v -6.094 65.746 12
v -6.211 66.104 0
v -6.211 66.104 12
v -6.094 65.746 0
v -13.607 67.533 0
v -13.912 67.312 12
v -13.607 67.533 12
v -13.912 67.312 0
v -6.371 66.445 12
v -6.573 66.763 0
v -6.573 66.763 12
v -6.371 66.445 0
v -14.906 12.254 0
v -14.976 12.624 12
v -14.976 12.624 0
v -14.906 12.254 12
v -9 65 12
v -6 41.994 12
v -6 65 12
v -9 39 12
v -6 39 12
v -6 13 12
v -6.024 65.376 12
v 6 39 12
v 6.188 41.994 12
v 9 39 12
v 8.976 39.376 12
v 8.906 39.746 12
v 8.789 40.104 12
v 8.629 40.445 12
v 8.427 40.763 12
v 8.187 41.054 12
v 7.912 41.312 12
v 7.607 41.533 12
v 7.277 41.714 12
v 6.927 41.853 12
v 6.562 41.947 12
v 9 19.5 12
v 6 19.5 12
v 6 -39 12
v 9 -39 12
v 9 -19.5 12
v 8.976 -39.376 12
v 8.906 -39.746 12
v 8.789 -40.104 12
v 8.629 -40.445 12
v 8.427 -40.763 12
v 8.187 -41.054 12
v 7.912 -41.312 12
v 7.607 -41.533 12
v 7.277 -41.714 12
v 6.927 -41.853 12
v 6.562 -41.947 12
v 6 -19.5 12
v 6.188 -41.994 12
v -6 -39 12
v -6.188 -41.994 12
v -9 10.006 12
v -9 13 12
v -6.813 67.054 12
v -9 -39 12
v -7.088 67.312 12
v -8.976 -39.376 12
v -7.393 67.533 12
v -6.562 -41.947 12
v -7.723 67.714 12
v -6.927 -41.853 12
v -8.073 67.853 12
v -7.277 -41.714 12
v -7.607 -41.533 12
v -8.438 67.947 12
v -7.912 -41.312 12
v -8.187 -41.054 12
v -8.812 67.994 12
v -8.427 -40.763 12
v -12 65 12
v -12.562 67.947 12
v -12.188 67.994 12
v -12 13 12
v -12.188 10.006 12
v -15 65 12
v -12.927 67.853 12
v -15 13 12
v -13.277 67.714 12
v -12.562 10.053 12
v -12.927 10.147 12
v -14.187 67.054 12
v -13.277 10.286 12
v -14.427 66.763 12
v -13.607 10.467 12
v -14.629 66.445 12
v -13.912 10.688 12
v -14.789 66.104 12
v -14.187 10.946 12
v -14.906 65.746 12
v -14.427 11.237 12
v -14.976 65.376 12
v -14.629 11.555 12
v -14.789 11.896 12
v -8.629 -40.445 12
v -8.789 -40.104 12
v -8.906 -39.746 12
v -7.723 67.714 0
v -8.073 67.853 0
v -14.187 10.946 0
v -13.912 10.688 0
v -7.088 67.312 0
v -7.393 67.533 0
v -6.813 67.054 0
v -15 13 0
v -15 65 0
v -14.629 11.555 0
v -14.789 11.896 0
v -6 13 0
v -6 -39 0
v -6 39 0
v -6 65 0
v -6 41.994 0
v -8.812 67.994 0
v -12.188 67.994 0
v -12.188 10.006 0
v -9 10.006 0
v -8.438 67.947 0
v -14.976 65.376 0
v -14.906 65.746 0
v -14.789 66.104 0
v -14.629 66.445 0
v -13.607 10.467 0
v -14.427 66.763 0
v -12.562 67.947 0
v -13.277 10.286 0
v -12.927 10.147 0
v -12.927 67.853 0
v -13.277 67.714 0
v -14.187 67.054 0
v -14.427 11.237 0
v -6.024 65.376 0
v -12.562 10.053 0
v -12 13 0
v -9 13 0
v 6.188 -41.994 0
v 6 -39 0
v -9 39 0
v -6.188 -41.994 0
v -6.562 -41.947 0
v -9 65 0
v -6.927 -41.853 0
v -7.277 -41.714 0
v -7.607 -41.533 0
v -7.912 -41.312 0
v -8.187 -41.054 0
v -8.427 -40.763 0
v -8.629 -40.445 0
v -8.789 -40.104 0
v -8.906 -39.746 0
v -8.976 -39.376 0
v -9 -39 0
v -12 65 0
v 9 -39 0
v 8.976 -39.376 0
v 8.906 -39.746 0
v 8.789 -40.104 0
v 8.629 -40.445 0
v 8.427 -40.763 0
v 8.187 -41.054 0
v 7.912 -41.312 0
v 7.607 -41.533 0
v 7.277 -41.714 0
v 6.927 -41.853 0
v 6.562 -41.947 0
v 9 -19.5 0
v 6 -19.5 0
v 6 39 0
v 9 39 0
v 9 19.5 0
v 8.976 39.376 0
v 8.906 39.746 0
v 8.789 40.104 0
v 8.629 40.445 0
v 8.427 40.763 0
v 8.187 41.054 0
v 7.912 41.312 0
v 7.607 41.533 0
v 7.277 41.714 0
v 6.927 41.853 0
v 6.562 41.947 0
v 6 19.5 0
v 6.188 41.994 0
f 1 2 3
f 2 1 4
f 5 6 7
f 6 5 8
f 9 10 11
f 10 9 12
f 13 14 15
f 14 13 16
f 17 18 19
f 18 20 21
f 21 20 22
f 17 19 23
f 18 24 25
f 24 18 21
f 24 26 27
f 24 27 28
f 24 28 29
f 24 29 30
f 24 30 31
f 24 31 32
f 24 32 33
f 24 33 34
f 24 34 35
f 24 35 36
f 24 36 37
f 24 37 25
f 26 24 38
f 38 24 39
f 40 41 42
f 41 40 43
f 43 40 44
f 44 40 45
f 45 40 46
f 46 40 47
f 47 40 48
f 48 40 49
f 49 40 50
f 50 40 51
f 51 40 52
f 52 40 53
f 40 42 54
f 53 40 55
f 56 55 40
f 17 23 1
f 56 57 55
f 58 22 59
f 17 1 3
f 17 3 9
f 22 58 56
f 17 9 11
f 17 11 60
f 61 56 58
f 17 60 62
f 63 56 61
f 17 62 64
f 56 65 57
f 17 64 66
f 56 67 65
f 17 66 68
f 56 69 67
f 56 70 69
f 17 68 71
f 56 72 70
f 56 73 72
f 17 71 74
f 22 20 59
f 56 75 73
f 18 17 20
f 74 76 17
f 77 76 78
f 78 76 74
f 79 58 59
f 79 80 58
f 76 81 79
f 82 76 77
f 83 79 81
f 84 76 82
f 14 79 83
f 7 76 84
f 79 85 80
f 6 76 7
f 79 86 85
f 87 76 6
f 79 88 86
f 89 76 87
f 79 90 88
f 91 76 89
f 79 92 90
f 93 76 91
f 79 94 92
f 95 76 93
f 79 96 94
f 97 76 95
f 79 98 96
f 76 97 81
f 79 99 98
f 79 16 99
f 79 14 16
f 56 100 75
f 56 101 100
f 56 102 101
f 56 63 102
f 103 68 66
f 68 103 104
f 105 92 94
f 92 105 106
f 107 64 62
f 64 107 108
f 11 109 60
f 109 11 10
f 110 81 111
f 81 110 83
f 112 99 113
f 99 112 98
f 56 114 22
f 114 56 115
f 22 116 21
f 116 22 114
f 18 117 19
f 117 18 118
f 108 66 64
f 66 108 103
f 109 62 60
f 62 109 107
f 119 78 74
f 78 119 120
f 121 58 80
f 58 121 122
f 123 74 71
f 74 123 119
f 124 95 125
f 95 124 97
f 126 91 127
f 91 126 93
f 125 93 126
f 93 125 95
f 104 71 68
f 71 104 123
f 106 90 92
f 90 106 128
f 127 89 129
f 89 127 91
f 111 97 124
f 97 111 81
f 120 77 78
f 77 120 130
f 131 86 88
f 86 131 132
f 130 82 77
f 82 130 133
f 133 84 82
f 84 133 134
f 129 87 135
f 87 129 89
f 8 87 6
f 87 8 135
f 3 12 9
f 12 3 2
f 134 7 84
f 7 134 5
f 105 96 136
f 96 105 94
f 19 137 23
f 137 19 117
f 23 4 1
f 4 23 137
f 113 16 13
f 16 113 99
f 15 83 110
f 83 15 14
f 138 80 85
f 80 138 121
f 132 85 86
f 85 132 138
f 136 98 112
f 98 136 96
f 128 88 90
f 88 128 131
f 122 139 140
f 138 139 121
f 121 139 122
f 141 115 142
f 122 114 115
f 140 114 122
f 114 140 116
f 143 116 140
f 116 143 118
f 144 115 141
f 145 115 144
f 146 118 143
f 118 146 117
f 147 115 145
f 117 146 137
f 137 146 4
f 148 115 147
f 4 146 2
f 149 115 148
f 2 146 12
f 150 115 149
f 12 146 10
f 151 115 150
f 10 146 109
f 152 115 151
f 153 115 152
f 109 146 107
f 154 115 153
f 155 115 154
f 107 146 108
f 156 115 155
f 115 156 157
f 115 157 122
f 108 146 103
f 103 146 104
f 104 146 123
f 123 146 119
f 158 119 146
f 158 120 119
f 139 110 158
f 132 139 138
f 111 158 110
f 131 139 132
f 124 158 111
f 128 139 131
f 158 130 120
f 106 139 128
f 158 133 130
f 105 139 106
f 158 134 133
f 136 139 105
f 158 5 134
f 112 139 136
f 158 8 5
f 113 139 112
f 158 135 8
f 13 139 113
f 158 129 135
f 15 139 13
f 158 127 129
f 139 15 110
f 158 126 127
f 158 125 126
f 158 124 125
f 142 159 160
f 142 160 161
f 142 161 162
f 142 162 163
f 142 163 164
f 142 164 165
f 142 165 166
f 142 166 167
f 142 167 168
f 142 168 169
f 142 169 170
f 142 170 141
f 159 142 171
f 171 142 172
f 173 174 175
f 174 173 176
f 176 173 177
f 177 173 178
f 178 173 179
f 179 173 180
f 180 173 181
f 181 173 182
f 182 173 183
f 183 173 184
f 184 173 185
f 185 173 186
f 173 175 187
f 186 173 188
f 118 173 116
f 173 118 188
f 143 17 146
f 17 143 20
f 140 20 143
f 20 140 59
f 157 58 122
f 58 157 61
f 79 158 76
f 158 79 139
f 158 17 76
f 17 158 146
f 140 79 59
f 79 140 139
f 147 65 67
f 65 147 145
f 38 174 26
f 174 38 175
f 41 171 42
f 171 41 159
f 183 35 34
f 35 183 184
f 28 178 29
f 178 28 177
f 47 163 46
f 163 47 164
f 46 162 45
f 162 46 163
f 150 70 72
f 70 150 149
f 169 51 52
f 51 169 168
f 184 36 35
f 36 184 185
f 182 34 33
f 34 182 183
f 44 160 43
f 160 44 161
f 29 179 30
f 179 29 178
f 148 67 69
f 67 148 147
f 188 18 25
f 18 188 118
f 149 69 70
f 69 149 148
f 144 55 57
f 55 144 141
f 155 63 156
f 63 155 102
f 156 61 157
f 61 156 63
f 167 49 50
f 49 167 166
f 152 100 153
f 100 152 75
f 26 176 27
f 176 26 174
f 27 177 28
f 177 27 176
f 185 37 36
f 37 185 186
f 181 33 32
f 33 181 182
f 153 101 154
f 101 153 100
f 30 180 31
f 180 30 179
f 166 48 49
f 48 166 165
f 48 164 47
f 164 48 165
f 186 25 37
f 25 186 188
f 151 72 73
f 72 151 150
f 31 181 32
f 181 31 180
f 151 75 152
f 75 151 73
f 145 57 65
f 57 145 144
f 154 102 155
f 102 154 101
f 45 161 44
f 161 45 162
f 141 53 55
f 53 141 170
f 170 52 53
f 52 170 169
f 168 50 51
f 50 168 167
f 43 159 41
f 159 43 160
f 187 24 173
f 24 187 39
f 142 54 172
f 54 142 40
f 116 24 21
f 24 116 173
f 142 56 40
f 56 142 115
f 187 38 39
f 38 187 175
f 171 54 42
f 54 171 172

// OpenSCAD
$fn=50;



//CUSTOMIZER VARIABLES
/* [Easy Photo Rig] */
 
//the thickness of your phone
phone_depth = 12; 

//the width of your phone
phone_width = 78; 

//the width of your ruler 
ruler_width = 52; 

//the thickness of your ruler
ruler_thickness = 3;  


//the width of the bracket
bracket_width = 12;  

//the thickness of the walls and radius of the corners
corner_radius =3; 
  
  
//use this to angle the phone down slightly. values above 10 are not recommended
tilt_angle = 0;

//CUSTOMIZER VARIABLES END




module ruler_holder()
{
    //offset the ruler holder from the phone holder
    rotate([0,0,tilt_angle])
    translate([-(phone_depth/2+corner_radius)-(ruler_thickness/2),phone_width/2,0])
difference()
{
hull()
{
    translate([-ruler_thickness/2,ruler_width/2,0])
        cylinder(h=bracket_width,r1=corner_radius,r2=corner_radius);
     translate([ruler_thickness/2,ruler_width/2,0])
        cylinder(h=bracket_width,r1=corner_radius,r2=corner_radius);  
   
   
       translate([-ruler_thickness/2,-ruler_width/2,0])
        cylinder(h=bracket_width,r1=corner_radius,r2=corner_radius);
     translate([ruler_thickness/2,-ruler_width/2,0])
        cylinder(h=bracket_width,r1=corner_radius,r2=corner_radius) ;
   
    
};

    cube([ruler_thickness/2*2,ruler_width/2*2,bracket_width*2+2],true);

}
}



module phone_holder()
{
difference()
{
hull()
{
    translate([-phone_depth/2,phone_width/2,0])
        cylinder(h=bracket_width,r1=corner_radius,r2=corner_radius);
     translate([phone_depth/2,phone_width/2,0])
        cylinder(h=bracket_width,r1=corner_radius,r2=corner_radius);  
   
   
       translate([-phone_depth/2,-phone_width/2,0])
        cylinder(h=bracket_width,r1=corner_radius,r2=corner_radius);
     translate([phone_depth/2,-phone_width/2,0])
        cylinder(h=bracket_width,r1=corner_radius,r2=corner_radius) ;
   
    
};

    cube([phone_depth/2*2,phone_width/2*2,bracket_width*2+2],true);

translate([bracket_width-2,0,0])
    cube([phone_depth/2*2,phone_width/2,bracket_width*2+2],true);
}
}



ruler_holder();
phone_holder();
